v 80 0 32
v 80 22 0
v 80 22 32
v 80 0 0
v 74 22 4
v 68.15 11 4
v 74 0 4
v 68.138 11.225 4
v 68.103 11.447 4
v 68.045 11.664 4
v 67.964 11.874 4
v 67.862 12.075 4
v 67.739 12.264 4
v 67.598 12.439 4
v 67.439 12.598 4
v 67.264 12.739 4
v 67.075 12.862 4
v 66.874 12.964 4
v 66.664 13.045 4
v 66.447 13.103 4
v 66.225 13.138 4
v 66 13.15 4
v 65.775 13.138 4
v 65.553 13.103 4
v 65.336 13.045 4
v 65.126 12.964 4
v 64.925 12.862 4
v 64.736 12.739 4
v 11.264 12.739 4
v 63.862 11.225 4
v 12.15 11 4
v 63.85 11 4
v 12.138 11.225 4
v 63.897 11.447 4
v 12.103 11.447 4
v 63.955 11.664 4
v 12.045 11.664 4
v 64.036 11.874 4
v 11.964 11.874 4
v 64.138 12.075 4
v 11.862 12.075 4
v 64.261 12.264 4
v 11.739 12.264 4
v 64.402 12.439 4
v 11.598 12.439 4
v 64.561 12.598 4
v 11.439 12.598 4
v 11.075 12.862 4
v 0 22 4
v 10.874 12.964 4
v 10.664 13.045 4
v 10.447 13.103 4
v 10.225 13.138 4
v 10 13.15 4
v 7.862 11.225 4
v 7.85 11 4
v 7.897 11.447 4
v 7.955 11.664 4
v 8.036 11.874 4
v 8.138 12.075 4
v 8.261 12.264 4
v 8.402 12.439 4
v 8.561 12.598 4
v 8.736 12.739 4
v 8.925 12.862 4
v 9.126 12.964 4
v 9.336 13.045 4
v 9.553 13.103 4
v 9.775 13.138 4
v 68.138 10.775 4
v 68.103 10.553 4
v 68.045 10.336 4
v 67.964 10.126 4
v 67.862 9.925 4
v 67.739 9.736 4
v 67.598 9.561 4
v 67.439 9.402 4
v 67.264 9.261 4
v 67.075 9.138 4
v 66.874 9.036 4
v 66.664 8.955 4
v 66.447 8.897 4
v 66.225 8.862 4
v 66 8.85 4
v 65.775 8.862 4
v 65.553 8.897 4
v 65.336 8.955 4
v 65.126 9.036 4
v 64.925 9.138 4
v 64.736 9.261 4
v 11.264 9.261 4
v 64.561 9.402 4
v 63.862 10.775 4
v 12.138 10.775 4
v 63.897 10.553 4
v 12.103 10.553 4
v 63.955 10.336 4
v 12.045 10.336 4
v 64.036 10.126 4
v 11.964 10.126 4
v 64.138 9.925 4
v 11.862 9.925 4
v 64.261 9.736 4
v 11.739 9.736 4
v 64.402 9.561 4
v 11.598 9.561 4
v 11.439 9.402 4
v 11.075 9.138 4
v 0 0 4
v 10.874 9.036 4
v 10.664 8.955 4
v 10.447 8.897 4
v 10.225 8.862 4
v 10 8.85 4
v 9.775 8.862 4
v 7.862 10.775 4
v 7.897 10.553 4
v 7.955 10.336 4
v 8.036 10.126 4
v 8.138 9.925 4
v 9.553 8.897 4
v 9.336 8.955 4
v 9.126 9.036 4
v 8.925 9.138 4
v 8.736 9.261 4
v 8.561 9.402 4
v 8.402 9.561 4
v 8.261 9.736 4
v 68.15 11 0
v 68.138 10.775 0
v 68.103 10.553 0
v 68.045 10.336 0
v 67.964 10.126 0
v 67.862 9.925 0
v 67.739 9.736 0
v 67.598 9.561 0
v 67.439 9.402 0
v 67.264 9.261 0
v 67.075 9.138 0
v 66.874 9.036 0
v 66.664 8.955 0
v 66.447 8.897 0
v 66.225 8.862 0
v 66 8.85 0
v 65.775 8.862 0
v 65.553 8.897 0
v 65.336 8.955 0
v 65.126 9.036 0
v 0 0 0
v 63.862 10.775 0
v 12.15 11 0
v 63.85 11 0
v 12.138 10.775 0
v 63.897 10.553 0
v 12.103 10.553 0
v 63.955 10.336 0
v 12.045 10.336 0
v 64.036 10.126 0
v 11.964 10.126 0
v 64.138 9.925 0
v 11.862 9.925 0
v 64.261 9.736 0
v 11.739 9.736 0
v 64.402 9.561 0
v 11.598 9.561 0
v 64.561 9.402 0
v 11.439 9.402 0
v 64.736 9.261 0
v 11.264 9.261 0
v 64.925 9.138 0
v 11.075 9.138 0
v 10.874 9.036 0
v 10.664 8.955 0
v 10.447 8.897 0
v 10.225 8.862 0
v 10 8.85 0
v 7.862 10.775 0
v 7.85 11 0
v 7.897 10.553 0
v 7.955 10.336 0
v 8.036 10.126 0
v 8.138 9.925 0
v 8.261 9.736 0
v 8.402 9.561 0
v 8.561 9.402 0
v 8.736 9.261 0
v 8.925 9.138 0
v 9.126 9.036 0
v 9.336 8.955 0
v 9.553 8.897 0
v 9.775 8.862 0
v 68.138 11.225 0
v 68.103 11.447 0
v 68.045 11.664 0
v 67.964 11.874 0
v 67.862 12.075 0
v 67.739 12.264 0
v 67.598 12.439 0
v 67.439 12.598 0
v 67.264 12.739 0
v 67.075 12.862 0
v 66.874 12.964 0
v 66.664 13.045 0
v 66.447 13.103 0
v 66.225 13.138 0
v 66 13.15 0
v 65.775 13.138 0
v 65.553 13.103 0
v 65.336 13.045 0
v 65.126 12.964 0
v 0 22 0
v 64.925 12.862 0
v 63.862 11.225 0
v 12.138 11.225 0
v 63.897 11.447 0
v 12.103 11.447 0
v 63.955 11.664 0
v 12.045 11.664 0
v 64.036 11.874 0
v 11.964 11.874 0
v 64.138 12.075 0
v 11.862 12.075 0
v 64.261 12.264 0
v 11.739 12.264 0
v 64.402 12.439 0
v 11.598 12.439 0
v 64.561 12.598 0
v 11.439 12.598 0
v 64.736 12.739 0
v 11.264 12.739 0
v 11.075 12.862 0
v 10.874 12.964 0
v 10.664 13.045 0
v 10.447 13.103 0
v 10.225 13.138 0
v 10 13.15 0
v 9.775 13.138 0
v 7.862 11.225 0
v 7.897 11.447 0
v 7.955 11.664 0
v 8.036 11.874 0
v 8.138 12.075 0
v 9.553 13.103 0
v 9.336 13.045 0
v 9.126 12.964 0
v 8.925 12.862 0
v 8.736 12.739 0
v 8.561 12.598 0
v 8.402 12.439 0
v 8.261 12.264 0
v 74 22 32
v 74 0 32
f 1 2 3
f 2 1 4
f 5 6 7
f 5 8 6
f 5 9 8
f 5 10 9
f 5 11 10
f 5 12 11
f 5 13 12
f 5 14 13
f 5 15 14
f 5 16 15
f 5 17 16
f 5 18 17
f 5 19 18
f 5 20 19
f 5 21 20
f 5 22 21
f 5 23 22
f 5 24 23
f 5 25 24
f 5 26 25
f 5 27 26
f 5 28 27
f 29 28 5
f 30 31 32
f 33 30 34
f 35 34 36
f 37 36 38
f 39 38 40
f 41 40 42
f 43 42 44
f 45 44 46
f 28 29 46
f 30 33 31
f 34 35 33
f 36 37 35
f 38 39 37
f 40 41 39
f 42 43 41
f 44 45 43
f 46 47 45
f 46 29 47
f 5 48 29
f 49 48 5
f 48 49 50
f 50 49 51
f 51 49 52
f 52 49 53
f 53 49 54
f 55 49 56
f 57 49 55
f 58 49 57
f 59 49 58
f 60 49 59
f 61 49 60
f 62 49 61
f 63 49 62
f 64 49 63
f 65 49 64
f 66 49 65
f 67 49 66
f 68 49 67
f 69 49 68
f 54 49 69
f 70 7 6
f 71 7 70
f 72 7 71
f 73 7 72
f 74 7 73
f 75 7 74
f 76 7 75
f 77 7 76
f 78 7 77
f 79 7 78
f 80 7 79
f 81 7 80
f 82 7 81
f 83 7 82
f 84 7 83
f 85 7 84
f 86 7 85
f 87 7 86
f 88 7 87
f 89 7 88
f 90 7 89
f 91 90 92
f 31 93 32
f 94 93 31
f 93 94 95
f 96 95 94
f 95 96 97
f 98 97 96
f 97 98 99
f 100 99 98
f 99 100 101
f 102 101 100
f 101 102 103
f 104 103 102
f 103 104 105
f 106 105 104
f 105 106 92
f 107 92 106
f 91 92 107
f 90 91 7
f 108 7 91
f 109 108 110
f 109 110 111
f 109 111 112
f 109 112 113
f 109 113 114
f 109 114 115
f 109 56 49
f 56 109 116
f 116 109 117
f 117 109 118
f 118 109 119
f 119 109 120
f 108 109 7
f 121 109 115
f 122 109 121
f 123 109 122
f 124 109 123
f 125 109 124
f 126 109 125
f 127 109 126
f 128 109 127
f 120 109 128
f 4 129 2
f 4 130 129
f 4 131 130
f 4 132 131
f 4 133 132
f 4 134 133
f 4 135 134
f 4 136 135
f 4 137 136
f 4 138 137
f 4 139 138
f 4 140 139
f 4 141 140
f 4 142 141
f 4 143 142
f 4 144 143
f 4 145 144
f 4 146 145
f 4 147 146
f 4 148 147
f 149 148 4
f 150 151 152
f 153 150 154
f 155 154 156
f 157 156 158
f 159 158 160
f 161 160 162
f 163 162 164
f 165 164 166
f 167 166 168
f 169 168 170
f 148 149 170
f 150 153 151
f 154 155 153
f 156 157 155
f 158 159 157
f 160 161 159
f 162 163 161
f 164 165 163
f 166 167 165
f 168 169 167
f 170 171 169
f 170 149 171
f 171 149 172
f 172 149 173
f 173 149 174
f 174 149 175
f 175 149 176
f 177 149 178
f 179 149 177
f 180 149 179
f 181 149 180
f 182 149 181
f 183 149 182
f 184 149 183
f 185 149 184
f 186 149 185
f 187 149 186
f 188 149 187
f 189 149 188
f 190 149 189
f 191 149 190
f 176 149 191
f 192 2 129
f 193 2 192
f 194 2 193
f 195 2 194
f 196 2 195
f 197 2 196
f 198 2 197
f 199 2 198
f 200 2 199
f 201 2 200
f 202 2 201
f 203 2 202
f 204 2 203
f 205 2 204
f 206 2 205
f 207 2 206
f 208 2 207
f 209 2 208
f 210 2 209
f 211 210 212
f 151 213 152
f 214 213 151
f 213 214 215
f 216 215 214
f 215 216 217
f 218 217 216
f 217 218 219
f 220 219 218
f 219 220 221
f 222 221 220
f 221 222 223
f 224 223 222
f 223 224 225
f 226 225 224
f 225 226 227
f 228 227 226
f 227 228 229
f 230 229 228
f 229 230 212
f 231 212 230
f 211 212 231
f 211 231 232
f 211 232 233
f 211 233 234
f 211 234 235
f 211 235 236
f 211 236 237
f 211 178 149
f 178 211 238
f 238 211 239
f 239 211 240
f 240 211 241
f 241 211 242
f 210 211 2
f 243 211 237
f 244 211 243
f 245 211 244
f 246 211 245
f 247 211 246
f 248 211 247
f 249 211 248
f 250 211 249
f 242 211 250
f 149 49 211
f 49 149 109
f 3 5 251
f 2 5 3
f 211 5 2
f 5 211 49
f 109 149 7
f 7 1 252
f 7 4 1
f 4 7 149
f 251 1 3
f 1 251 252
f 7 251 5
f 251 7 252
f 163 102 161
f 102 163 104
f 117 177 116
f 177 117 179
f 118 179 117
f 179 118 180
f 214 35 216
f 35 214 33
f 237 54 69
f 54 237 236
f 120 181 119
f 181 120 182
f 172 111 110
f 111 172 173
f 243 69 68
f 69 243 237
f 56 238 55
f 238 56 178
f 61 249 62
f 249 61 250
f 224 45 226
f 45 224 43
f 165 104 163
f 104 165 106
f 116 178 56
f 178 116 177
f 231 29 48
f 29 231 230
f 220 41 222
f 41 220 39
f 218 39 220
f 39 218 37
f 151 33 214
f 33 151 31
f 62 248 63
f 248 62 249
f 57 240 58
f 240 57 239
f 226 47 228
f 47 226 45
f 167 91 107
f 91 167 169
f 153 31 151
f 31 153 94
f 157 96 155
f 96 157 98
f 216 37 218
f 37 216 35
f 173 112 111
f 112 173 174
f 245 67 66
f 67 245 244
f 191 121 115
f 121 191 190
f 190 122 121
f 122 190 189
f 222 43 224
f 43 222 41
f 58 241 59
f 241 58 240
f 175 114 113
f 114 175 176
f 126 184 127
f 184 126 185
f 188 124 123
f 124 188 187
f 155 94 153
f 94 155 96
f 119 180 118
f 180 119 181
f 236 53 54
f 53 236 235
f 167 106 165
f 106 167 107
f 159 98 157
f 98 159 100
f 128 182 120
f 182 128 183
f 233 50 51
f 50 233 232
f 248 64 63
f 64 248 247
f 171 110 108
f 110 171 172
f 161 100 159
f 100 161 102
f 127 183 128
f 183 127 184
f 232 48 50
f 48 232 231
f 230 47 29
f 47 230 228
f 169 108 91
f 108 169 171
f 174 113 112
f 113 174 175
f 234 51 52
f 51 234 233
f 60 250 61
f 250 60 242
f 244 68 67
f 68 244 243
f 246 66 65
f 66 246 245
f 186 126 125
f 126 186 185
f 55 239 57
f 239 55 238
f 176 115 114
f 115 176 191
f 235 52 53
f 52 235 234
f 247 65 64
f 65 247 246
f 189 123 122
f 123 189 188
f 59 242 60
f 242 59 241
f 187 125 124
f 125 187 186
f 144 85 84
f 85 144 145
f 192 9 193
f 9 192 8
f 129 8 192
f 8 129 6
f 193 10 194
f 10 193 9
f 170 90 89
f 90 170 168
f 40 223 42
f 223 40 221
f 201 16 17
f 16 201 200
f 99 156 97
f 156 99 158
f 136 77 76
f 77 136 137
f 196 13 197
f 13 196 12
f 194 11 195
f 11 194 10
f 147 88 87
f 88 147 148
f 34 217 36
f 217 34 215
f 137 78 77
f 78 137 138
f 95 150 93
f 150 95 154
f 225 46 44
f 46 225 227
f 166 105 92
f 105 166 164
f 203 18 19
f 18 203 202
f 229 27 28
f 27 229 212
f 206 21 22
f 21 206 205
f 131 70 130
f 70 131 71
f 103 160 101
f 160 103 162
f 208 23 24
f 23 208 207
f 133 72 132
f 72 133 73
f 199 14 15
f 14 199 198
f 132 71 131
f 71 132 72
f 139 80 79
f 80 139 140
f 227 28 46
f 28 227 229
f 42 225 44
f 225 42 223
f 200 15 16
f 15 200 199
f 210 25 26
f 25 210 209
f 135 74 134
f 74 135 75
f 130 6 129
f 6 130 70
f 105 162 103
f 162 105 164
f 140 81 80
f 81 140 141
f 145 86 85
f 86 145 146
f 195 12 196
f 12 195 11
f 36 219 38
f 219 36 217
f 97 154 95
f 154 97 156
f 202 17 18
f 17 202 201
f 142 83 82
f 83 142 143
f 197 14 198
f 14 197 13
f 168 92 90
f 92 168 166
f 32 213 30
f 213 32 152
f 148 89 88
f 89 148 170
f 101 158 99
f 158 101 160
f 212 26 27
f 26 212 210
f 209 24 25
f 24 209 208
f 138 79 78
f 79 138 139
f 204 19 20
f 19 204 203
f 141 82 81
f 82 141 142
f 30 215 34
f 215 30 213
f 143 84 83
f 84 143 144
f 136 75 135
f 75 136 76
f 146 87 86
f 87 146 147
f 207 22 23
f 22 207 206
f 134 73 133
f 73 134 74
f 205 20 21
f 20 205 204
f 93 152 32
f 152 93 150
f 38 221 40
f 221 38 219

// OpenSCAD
// Latch catch plate.
$fn = 60;
eps = 0.02;
length = 80;
height = 28;
width = 22;
thickness = 4;
difference() {
    union() { cube([length,width,thickness]); translate([length-6,0,thickness]) cube([6,width,height]); }
    for(x=[10,length-14]) translate([x,width/2,-eps]) cylinder(d=4.3,h=thickness+2*eps);
}
